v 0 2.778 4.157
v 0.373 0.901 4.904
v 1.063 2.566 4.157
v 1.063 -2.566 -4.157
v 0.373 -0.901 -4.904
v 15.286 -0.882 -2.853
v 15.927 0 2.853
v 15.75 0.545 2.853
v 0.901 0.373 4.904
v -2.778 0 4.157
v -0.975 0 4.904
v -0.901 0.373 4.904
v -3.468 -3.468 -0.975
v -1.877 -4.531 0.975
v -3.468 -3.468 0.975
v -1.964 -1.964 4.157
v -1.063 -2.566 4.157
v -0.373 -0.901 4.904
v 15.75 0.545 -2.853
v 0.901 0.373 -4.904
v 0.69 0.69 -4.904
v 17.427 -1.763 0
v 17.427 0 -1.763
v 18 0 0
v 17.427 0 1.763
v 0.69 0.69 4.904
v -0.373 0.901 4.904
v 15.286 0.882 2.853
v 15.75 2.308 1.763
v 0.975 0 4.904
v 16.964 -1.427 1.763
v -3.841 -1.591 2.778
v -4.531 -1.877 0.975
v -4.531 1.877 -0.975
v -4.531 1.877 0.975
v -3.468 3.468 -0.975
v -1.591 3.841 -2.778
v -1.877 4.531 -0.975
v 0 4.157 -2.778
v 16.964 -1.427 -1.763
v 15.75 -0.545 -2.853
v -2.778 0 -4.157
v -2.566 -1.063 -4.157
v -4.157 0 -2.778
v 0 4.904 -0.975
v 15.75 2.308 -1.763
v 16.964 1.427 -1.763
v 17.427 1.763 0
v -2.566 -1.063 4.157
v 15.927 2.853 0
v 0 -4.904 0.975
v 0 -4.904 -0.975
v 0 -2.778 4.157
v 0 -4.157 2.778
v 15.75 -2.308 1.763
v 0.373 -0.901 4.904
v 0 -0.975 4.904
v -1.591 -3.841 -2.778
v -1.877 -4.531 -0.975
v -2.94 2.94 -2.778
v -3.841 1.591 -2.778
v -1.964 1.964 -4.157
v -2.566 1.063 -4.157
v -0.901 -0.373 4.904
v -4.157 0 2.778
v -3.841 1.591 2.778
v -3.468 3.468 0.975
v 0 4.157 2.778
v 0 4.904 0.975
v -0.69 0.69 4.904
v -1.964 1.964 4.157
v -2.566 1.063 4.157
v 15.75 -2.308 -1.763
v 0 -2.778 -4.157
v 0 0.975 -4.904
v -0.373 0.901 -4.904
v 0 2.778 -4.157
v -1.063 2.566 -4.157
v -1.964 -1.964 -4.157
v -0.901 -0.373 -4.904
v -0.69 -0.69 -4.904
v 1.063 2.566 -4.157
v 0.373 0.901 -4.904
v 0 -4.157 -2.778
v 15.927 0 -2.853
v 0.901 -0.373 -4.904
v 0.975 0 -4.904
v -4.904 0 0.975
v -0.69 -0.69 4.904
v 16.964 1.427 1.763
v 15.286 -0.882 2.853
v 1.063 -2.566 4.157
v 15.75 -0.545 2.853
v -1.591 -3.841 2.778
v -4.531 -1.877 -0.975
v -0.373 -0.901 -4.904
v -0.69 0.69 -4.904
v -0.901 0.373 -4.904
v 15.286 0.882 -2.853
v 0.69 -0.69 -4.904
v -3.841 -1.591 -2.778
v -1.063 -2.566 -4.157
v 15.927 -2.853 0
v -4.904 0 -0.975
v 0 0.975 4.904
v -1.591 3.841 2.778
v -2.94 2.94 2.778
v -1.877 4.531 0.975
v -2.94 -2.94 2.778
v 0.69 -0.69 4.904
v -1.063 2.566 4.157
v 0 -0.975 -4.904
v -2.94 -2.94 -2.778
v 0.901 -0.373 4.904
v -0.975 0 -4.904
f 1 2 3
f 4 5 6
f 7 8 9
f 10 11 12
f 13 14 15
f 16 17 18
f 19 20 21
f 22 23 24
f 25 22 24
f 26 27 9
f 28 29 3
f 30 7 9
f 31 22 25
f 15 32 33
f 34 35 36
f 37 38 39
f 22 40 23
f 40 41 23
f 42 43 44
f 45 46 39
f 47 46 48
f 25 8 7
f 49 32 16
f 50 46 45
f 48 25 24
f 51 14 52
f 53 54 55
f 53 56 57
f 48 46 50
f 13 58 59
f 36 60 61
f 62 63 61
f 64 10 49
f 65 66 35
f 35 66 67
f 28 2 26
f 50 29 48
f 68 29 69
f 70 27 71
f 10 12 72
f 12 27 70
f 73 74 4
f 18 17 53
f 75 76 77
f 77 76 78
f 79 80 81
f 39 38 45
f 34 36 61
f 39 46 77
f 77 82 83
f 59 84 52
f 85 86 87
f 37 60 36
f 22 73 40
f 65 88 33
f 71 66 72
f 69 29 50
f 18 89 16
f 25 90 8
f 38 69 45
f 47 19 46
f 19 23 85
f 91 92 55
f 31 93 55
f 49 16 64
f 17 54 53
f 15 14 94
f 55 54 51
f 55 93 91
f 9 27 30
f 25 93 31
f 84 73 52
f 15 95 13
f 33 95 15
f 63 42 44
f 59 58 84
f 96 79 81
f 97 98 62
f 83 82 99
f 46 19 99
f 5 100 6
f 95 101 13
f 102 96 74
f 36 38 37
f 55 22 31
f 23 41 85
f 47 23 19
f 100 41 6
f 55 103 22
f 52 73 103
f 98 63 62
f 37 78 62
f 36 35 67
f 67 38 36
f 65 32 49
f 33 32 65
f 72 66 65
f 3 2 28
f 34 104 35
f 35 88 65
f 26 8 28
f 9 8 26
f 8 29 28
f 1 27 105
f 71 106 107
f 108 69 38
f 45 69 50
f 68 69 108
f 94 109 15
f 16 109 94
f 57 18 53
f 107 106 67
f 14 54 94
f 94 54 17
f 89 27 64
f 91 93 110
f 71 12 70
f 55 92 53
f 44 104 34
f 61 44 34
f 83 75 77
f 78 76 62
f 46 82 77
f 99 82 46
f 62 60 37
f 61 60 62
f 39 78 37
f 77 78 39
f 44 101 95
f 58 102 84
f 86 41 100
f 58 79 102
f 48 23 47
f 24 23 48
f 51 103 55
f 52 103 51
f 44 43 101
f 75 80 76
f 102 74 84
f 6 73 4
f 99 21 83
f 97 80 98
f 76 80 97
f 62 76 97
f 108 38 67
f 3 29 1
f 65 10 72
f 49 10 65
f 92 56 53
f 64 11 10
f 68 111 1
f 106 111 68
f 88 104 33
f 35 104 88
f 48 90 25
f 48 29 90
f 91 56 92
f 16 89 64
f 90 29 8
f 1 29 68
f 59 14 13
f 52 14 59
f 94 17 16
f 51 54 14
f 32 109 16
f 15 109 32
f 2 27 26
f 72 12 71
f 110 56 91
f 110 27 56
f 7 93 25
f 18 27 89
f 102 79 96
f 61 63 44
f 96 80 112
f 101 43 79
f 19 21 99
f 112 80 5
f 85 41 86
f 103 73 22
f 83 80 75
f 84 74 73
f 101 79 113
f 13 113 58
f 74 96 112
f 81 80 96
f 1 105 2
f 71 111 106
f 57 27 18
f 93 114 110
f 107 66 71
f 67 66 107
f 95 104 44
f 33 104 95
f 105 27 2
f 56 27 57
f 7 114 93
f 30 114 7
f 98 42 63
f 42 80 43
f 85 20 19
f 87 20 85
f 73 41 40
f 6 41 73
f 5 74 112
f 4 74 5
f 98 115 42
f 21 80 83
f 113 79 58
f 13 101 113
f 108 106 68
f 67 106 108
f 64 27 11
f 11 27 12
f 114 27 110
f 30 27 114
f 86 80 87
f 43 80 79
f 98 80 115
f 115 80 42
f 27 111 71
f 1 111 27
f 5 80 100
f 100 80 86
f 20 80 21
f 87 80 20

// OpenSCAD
// Hull of two spheres
hull() {
  sphere(r=5);
  translate([15, 0, 0]) sphere(r=3);
}
